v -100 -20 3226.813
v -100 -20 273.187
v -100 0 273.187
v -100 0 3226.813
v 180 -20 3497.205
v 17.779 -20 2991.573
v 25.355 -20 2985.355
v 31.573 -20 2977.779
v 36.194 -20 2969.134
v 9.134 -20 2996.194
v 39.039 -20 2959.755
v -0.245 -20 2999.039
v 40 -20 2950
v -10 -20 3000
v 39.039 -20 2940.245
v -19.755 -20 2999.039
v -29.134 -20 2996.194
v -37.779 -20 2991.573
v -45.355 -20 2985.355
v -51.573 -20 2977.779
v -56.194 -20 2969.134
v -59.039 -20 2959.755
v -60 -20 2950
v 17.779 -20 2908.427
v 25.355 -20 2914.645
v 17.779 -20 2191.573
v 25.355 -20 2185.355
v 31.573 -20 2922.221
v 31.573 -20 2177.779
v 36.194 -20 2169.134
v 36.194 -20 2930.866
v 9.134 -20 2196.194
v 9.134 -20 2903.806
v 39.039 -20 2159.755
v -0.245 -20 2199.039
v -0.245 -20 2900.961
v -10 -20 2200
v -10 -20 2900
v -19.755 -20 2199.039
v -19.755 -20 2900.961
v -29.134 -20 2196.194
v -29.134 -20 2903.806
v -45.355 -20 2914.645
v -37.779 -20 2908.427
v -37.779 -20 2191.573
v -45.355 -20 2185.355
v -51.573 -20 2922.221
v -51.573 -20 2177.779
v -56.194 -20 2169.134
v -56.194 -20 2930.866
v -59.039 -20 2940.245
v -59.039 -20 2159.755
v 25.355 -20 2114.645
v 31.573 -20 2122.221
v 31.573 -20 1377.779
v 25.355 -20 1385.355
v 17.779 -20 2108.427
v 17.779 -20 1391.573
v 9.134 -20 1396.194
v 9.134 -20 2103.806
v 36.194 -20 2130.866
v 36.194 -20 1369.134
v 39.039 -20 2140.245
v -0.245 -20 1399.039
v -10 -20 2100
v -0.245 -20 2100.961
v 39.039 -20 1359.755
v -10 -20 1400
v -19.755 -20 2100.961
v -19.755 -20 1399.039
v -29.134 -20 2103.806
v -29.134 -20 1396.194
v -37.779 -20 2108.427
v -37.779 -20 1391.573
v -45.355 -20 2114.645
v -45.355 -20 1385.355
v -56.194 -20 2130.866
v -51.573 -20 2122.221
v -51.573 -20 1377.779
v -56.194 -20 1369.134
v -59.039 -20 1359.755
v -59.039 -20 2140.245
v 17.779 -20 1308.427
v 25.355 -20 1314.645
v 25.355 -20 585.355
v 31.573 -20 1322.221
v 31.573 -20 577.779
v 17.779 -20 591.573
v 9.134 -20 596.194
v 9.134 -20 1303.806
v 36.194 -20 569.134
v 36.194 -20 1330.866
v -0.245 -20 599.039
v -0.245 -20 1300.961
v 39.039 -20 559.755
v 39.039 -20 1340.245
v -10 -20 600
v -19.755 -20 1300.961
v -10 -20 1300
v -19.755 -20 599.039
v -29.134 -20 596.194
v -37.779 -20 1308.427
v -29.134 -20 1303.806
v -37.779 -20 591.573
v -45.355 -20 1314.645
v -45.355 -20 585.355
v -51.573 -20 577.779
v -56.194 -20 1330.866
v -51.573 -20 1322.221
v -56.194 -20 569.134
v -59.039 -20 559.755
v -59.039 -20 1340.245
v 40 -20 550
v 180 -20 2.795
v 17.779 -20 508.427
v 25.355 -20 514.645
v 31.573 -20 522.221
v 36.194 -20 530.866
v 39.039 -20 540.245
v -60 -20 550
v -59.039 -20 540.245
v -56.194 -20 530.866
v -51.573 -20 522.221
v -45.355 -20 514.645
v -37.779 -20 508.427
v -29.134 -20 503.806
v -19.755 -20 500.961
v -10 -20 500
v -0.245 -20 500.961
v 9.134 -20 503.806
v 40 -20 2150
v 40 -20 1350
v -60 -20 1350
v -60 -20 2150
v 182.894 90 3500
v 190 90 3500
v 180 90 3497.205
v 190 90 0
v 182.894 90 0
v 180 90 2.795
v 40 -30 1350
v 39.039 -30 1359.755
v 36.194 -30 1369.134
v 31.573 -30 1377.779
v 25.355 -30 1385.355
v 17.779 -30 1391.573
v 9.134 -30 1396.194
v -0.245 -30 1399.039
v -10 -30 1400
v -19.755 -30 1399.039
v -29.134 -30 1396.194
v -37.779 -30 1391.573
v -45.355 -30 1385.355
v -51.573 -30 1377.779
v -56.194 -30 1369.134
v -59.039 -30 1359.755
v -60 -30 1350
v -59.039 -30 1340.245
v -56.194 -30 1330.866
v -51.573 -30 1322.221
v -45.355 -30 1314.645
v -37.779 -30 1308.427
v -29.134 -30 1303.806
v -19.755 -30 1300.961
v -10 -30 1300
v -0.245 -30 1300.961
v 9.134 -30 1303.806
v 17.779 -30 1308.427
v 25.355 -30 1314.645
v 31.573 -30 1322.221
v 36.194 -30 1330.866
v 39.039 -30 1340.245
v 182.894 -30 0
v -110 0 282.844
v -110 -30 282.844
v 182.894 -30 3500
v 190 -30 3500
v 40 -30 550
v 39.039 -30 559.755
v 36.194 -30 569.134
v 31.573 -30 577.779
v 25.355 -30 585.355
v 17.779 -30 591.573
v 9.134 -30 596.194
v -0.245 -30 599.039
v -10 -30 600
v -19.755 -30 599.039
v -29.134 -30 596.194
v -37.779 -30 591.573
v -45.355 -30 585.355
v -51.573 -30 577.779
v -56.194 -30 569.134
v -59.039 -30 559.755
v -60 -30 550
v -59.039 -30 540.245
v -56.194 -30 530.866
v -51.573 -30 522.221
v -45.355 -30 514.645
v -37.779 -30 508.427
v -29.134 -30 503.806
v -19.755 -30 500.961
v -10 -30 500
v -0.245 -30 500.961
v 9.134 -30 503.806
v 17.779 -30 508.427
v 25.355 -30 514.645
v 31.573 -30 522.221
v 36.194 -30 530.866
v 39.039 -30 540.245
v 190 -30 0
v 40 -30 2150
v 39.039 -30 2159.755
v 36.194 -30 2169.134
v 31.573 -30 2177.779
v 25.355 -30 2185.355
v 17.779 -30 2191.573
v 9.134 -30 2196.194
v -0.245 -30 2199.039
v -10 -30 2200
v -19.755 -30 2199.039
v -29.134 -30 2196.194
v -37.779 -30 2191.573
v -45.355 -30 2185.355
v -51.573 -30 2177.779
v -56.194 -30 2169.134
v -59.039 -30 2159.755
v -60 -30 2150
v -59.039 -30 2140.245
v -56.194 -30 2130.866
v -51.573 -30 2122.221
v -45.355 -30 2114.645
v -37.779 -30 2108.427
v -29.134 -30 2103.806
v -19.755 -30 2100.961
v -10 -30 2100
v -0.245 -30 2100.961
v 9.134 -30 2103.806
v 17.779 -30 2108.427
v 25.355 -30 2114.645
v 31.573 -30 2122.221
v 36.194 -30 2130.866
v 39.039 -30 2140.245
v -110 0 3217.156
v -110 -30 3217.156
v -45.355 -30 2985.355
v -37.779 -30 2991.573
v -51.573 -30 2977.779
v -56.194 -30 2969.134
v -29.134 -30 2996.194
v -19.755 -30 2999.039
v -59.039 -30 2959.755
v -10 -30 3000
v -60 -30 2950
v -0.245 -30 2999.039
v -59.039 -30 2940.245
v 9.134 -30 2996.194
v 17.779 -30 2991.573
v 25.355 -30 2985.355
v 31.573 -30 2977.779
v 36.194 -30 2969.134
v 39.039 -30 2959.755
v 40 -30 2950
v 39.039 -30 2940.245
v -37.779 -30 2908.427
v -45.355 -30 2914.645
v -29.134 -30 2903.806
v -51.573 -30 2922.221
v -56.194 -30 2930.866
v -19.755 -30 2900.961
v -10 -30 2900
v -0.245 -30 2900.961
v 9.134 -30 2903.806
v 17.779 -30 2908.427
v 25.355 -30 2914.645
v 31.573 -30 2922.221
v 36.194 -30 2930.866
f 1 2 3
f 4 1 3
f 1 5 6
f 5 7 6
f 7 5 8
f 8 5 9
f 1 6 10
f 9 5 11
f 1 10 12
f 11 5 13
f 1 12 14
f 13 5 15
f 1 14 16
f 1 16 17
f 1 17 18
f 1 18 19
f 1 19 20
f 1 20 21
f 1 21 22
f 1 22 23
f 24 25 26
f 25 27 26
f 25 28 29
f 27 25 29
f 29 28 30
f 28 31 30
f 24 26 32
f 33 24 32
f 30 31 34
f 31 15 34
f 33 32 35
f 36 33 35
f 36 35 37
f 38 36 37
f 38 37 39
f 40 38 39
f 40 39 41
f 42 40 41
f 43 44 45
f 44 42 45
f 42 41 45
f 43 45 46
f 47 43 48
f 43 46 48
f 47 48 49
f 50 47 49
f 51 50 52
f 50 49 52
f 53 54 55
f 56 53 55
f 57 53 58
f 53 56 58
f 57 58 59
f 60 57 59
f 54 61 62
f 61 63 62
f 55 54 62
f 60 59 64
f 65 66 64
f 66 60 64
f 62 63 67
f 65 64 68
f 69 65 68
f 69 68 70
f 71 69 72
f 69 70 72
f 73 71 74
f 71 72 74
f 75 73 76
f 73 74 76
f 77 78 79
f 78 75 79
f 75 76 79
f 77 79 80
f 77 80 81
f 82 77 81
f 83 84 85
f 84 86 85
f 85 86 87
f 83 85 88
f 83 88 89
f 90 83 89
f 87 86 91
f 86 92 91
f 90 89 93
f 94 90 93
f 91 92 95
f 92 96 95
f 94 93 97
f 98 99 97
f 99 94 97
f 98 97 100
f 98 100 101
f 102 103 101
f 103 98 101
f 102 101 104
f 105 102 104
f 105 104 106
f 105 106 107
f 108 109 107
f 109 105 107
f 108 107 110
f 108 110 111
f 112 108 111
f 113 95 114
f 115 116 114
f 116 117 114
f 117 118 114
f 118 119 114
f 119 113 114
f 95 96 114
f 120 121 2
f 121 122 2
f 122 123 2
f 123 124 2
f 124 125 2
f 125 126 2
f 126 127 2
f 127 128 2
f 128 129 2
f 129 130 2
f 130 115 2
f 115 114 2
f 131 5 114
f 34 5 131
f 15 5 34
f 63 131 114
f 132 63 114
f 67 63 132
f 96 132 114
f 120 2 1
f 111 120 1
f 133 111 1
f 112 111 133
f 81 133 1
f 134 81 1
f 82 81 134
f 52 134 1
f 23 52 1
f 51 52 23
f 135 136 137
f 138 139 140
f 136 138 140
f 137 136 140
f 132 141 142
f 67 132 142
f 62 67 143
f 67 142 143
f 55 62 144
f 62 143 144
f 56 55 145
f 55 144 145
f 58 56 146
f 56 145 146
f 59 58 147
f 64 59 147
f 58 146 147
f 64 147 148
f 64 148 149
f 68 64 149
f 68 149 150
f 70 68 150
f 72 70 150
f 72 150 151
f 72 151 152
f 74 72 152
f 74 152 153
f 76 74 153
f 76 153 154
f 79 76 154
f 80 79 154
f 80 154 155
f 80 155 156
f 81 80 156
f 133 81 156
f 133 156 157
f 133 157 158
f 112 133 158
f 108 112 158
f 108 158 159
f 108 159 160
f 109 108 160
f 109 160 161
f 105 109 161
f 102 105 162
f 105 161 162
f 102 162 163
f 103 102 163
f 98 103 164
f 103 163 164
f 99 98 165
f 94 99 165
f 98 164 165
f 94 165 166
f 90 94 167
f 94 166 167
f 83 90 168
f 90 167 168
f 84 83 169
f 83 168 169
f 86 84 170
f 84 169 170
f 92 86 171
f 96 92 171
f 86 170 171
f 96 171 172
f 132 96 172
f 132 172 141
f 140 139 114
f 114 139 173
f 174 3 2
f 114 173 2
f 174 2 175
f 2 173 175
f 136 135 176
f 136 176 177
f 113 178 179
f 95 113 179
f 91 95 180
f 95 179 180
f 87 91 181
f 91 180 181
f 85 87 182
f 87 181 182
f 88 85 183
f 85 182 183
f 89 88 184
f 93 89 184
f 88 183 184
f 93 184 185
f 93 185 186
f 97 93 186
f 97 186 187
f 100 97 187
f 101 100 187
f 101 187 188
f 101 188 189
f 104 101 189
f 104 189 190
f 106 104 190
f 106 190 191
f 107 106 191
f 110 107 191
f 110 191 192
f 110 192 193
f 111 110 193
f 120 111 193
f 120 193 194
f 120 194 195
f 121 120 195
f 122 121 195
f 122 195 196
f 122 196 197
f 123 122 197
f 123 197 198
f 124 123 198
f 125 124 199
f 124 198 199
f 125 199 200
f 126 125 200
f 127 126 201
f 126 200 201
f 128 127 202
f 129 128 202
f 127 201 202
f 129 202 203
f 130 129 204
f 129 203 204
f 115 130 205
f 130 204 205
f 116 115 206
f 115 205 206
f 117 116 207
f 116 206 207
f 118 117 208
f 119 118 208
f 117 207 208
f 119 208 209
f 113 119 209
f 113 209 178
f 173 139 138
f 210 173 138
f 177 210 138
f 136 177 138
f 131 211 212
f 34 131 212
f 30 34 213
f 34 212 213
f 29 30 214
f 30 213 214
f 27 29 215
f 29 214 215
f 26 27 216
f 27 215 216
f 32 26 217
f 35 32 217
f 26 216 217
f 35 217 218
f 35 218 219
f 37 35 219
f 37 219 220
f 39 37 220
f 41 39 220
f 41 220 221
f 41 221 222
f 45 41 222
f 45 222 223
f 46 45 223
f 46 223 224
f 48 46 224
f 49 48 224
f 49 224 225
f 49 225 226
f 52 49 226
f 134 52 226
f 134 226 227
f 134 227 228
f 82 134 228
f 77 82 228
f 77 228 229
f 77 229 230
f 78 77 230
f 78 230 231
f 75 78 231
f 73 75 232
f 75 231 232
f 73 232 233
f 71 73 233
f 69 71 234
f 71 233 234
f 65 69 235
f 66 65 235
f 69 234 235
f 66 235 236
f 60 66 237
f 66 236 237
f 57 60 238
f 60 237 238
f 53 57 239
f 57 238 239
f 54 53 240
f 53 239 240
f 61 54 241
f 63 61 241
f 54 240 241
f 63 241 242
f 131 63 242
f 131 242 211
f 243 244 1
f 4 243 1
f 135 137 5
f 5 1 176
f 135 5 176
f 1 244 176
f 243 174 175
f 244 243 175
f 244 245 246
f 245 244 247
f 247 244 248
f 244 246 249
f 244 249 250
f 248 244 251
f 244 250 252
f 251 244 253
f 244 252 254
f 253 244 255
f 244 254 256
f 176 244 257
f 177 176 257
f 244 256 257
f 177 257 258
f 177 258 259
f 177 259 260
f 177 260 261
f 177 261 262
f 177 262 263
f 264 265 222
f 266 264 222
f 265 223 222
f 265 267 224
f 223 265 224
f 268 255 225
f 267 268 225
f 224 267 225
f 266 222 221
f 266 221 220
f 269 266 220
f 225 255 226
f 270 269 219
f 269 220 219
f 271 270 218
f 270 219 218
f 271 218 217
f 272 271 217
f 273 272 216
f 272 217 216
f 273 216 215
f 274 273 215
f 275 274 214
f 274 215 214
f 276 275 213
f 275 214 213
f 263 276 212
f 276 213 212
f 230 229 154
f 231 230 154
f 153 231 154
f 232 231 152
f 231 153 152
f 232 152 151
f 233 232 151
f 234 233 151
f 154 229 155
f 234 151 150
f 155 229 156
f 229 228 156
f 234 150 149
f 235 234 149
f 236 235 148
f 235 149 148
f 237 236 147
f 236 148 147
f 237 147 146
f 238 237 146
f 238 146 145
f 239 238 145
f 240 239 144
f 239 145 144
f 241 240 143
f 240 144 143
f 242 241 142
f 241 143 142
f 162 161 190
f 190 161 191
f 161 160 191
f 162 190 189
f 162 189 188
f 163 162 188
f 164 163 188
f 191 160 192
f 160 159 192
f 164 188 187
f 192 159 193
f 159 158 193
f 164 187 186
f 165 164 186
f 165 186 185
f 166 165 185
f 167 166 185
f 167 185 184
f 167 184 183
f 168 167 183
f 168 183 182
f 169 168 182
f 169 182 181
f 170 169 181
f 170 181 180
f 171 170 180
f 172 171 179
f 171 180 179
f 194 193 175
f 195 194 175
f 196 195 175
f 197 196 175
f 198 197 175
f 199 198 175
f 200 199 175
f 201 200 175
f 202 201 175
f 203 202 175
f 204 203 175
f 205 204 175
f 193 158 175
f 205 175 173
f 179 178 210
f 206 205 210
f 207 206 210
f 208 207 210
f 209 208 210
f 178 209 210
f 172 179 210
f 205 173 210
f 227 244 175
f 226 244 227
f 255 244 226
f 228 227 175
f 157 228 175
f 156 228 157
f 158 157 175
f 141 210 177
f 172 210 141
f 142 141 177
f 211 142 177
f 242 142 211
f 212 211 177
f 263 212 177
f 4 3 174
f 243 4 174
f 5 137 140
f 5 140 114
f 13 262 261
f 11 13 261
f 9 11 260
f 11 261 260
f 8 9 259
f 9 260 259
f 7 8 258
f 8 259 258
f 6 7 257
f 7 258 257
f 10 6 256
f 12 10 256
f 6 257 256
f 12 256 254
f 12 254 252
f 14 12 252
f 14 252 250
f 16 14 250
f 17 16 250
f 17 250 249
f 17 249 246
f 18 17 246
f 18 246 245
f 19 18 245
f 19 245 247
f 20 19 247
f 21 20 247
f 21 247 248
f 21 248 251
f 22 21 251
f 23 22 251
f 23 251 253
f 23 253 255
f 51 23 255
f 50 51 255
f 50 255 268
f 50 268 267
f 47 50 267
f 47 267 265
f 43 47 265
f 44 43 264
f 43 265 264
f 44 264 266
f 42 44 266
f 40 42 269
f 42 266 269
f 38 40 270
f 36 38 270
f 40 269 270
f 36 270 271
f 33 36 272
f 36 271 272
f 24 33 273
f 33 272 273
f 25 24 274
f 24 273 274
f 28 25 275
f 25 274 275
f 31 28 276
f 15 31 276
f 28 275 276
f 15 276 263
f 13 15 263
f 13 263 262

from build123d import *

# Parameters (mm, degrees)
F1_DEPTH = 3500
F3_DEPTH = 200
F4_R     = 50
F5_DEPTH = 120.001


# Not quite as in the source:
# - a feature names something its author has since deleted; it is built from what else it names


with BuildPart() as f1:
    # F0 (on Top) → F1 (new body)
    with BuildSketch(Plane.XY):
        Polygon((-100, 0), (-110, 0), (-110, -30), (190, -30), (190, 90), (180, 90), (180, -20), (-100, -20), align=None)
    extrude(amount=F1_DEPTH)

    # F2 (on face) → F3 (cut)
    with BuildSketch(Plane.XZ.offset(30)):
        Polygon((182.8939372419, 0), (-110, 282.8443874035), (-110, 0), align=None)
        Polygon((-110, 3500), (-110, 3217.1556125965), (182.8939372419, 3500), align=None)
    extrude(amount=-F3_DEPTH, mode=Mode.SUBTRACT)

    # F4 (on face) → F5 (cut, through all)
    with BuildSketch(Plane.XZ.offset(30)):
        with Locations((-10, 2950)):
            Circle(F4_R)
        with Locations((-10, 2150)):
            Circle(F4_R)
        with Locations((-10, 1350)):
            Circle(F4_R)
        with Locations((-10, 550)):
            Circle(F4_R)
    extrude(amount=-F5_DEPTH, mode=Mode.SUBTRACT)


solid = f1.part
